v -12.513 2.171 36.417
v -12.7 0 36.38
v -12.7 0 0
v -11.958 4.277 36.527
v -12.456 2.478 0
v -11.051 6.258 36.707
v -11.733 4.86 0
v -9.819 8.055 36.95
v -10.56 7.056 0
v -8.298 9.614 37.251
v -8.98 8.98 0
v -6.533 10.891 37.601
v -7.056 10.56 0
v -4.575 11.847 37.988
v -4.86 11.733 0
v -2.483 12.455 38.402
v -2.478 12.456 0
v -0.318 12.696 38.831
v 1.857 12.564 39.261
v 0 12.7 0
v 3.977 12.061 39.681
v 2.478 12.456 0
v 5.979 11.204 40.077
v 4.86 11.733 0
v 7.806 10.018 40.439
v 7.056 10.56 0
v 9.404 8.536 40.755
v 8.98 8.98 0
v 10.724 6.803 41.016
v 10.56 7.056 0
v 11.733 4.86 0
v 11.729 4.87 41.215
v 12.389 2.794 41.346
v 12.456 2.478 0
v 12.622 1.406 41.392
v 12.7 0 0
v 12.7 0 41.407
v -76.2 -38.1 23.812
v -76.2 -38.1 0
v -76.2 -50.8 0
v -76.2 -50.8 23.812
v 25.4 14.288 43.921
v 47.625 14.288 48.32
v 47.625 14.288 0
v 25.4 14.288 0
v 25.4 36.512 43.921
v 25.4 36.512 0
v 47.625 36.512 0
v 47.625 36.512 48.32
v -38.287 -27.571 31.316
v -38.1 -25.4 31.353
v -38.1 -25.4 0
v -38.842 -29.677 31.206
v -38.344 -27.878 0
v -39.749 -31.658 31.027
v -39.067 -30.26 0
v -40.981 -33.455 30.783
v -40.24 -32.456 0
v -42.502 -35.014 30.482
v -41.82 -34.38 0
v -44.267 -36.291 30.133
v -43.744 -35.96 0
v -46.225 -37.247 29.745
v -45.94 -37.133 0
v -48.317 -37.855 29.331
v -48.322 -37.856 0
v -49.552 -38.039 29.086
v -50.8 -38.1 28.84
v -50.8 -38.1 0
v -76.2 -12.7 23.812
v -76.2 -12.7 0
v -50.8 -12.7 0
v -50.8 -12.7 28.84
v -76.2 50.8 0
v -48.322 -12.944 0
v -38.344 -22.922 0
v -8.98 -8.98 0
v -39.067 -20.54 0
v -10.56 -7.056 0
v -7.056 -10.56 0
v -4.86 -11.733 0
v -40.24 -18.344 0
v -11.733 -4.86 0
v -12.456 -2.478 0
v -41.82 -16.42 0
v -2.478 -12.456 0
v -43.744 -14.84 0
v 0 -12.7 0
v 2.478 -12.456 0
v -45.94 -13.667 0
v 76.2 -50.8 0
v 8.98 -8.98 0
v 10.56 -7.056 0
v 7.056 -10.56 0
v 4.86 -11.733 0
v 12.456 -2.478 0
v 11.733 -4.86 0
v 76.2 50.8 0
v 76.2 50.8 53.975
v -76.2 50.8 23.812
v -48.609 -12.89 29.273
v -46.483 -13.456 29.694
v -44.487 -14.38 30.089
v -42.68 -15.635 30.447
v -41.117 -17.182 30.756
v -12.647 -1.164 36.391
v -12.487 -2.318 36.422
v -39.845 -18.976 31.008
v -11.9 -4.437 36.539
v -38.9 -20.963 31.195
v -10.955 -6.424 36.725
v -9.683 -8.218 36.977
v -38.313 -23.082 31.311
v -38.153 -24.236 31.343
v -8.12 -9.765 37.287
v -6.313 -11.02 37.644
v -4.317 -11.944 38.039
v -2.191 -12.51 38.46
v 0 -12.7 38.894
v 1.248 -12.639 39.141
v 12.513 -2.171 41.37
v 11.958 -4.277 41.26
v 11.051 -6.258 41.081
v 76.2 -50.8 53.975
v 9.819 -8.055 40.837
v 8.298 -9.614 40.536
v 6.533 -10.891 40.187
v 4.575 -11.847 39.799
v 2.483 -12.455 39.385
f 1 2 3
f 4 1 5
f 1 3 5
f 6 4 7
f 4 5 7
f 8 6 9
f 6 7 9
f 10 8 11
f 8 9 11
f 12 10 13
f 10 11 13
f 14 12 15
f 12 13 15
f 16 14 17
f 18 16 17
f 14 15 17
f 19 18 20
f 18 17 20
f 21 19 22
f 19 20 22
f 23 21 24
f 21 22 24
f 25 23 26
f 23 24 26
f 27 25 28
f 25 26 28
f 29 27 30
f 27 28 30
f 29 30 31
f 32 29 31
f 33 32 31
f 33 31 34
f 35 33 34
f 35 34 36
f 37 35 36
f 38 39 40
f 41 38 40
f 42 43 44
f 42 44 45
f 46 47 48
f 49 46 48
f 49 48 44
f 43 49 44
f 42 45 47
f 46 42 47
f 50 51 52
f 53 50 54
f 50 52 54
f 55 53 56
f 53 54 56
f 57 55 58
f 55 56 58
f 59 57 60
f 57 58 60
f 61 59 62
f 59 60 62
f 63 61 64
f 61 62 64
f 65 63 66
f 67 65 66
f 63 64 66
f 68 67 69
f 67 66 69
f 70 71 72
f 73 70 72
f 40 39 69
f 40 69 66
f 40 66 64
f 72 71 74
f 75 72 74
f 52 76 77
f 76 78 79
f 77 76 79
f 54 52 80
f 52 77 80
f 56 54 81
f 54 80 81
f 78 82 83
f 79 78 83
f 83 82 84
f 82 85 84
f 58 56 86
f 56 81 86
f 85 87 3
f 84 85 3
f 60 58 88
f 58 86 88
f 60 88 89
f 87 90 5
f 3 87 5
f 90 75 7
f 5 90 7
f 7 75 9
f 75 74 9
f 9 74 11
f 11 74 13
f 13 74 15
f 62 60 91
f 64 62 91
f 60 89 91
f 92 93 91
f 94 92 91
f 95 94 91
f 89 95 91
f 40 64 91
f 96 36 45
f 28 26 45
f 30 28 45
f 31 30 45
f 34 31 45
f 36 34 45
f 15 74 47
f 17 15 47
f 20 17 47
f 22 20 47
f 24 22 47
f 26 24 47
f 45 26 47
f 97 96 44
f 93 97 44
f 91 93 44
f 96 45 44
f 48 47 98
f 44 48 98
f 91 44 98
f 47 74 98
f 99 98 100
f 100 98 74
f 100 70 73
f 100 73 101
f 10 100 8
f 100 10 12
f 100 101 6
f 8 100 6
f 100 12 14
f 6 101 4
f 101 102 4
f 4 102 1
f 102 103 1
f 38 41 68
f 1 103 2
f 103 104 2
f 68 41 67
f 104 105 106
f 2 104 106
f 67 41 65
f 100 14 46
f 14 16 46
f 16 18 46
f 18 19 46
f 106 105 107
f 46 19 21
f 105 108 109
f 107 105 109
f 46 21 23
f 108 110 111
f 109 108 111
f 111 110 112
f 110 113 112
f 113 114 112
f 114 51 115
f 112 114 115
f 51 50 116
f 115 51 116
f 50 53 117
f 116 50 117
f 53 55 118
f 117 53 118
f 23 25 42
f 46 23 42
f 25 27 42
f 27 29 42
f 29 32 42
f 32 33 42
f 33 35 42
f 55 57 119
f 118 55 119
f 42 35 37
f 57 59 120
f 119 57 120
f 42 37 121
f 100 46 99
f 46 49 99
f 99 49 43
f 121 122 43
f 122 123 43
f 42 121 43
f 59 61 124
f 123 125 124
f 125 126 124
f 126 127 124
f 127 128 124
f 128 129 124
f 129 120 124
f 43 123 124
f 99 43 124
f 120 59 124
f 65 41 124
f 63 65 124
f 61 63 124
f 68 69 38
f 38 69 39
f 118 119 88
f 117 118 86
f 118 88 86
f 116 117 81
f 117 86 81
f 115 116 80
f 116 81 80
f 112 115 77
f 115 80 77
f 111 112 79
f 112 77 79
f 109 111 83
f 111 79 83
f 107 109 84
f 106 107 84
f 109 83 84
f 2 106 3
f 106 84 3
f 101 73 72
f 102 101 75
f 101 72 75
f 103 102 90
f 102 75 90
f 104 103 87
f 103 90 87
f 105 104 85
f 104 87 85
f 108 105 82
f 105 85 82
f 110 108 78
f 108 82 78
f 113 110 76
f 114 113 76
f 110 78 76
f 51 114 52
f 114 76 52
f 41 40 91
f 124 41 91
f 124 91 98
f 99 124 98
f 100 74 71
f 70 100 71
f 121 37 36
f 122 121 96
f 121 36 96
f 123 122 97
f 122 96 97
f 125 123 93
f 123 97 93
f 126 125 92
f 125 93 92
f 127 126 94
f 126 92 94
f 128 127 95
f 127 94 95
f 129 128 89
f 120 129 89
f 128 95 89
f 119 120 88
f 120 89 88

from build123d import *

# Parameters (mm, degrees)
F1_DEPTH = 53.975
F3_DEPTH = 101.6


with BuildPart() as f1:
    # F0 (on Top) → F1 (new body)
    with BuildSketch(Plane.XY):
        Polygon((36.5125, -50.8), (76.2, -50.8), (76.2, 50.8), (-76.2, 50.8), (-76.2, 25.4), (25.4, 25.4), (25.4, 36.5125), (47.625, 36.5125), (47.625, 14.2875), (36.5125, 14.2875), align=None)
        with BuildLine():
            Line((-76.2, -50.8), (0, -50.8))
            Line((0, -50.8), (0, -12.7))
            ThreePointArc((0, -12.7), (-8.9802561211, -8.9802561211), (-12.7, 0))
            Line((-12.7, 0), (-76.2, 0))
            Line((-76.2, 0), (-76.2, -12.7))
            Line((-76.2, -12.7), (-50.8, -12.7))
            ThreePointArc((-50.8, -12.7), (-41.8197438789, -16.4197438789), (-38.1, -25.4))
            ThreePointArc((-38.1, -25.4), (-41.8197438789, -34.3802561211), (-50.8, -38.1))
            Line((-50.8, -38.1), (-76.2, -38.1))
            Line((-76.2, -38.1), (-76.2, -50.8))
        make_face()
        with BuildLine():
            Line((0, -50.8), (36.5125, -50.8))
            Line((36.5125, -50.8), (36.5125, 14.2875))
            Line((36.5125, 14.2875), (25.4, 14.2875))
            Line((25.4, 14.2875), (25.4, 25.4))
            Line((25.4, 25.4), (-76.2, 25.4))
            Line((-76.2, 25.4), (-76.2, 0))
            Line((-76.2, 0), (-12.7, 0))
            ThreePointArc((-12.7, 0), (0, 12.7), (12.7, 0))
            ThreePointArc((12.7, 0), (8.9802561211, -8.9802561211), (0, -12.7))
            Line((0, -12.7), (0, -50.8))
        make_face()
    extrude(amount=F1_DEPTH)

    # F2 (on face) → F3 (cut)
    with BuildSketch(Plane.XZ.offset(50.8)):
        Polygon((-76.2, 23.8125), (76.2, 53.975), (-76.2, 53.975), align=None)
    extrude(amount=-F3_DEPTH, mode=Mode.SUBTRACT)


solid = f1.part
